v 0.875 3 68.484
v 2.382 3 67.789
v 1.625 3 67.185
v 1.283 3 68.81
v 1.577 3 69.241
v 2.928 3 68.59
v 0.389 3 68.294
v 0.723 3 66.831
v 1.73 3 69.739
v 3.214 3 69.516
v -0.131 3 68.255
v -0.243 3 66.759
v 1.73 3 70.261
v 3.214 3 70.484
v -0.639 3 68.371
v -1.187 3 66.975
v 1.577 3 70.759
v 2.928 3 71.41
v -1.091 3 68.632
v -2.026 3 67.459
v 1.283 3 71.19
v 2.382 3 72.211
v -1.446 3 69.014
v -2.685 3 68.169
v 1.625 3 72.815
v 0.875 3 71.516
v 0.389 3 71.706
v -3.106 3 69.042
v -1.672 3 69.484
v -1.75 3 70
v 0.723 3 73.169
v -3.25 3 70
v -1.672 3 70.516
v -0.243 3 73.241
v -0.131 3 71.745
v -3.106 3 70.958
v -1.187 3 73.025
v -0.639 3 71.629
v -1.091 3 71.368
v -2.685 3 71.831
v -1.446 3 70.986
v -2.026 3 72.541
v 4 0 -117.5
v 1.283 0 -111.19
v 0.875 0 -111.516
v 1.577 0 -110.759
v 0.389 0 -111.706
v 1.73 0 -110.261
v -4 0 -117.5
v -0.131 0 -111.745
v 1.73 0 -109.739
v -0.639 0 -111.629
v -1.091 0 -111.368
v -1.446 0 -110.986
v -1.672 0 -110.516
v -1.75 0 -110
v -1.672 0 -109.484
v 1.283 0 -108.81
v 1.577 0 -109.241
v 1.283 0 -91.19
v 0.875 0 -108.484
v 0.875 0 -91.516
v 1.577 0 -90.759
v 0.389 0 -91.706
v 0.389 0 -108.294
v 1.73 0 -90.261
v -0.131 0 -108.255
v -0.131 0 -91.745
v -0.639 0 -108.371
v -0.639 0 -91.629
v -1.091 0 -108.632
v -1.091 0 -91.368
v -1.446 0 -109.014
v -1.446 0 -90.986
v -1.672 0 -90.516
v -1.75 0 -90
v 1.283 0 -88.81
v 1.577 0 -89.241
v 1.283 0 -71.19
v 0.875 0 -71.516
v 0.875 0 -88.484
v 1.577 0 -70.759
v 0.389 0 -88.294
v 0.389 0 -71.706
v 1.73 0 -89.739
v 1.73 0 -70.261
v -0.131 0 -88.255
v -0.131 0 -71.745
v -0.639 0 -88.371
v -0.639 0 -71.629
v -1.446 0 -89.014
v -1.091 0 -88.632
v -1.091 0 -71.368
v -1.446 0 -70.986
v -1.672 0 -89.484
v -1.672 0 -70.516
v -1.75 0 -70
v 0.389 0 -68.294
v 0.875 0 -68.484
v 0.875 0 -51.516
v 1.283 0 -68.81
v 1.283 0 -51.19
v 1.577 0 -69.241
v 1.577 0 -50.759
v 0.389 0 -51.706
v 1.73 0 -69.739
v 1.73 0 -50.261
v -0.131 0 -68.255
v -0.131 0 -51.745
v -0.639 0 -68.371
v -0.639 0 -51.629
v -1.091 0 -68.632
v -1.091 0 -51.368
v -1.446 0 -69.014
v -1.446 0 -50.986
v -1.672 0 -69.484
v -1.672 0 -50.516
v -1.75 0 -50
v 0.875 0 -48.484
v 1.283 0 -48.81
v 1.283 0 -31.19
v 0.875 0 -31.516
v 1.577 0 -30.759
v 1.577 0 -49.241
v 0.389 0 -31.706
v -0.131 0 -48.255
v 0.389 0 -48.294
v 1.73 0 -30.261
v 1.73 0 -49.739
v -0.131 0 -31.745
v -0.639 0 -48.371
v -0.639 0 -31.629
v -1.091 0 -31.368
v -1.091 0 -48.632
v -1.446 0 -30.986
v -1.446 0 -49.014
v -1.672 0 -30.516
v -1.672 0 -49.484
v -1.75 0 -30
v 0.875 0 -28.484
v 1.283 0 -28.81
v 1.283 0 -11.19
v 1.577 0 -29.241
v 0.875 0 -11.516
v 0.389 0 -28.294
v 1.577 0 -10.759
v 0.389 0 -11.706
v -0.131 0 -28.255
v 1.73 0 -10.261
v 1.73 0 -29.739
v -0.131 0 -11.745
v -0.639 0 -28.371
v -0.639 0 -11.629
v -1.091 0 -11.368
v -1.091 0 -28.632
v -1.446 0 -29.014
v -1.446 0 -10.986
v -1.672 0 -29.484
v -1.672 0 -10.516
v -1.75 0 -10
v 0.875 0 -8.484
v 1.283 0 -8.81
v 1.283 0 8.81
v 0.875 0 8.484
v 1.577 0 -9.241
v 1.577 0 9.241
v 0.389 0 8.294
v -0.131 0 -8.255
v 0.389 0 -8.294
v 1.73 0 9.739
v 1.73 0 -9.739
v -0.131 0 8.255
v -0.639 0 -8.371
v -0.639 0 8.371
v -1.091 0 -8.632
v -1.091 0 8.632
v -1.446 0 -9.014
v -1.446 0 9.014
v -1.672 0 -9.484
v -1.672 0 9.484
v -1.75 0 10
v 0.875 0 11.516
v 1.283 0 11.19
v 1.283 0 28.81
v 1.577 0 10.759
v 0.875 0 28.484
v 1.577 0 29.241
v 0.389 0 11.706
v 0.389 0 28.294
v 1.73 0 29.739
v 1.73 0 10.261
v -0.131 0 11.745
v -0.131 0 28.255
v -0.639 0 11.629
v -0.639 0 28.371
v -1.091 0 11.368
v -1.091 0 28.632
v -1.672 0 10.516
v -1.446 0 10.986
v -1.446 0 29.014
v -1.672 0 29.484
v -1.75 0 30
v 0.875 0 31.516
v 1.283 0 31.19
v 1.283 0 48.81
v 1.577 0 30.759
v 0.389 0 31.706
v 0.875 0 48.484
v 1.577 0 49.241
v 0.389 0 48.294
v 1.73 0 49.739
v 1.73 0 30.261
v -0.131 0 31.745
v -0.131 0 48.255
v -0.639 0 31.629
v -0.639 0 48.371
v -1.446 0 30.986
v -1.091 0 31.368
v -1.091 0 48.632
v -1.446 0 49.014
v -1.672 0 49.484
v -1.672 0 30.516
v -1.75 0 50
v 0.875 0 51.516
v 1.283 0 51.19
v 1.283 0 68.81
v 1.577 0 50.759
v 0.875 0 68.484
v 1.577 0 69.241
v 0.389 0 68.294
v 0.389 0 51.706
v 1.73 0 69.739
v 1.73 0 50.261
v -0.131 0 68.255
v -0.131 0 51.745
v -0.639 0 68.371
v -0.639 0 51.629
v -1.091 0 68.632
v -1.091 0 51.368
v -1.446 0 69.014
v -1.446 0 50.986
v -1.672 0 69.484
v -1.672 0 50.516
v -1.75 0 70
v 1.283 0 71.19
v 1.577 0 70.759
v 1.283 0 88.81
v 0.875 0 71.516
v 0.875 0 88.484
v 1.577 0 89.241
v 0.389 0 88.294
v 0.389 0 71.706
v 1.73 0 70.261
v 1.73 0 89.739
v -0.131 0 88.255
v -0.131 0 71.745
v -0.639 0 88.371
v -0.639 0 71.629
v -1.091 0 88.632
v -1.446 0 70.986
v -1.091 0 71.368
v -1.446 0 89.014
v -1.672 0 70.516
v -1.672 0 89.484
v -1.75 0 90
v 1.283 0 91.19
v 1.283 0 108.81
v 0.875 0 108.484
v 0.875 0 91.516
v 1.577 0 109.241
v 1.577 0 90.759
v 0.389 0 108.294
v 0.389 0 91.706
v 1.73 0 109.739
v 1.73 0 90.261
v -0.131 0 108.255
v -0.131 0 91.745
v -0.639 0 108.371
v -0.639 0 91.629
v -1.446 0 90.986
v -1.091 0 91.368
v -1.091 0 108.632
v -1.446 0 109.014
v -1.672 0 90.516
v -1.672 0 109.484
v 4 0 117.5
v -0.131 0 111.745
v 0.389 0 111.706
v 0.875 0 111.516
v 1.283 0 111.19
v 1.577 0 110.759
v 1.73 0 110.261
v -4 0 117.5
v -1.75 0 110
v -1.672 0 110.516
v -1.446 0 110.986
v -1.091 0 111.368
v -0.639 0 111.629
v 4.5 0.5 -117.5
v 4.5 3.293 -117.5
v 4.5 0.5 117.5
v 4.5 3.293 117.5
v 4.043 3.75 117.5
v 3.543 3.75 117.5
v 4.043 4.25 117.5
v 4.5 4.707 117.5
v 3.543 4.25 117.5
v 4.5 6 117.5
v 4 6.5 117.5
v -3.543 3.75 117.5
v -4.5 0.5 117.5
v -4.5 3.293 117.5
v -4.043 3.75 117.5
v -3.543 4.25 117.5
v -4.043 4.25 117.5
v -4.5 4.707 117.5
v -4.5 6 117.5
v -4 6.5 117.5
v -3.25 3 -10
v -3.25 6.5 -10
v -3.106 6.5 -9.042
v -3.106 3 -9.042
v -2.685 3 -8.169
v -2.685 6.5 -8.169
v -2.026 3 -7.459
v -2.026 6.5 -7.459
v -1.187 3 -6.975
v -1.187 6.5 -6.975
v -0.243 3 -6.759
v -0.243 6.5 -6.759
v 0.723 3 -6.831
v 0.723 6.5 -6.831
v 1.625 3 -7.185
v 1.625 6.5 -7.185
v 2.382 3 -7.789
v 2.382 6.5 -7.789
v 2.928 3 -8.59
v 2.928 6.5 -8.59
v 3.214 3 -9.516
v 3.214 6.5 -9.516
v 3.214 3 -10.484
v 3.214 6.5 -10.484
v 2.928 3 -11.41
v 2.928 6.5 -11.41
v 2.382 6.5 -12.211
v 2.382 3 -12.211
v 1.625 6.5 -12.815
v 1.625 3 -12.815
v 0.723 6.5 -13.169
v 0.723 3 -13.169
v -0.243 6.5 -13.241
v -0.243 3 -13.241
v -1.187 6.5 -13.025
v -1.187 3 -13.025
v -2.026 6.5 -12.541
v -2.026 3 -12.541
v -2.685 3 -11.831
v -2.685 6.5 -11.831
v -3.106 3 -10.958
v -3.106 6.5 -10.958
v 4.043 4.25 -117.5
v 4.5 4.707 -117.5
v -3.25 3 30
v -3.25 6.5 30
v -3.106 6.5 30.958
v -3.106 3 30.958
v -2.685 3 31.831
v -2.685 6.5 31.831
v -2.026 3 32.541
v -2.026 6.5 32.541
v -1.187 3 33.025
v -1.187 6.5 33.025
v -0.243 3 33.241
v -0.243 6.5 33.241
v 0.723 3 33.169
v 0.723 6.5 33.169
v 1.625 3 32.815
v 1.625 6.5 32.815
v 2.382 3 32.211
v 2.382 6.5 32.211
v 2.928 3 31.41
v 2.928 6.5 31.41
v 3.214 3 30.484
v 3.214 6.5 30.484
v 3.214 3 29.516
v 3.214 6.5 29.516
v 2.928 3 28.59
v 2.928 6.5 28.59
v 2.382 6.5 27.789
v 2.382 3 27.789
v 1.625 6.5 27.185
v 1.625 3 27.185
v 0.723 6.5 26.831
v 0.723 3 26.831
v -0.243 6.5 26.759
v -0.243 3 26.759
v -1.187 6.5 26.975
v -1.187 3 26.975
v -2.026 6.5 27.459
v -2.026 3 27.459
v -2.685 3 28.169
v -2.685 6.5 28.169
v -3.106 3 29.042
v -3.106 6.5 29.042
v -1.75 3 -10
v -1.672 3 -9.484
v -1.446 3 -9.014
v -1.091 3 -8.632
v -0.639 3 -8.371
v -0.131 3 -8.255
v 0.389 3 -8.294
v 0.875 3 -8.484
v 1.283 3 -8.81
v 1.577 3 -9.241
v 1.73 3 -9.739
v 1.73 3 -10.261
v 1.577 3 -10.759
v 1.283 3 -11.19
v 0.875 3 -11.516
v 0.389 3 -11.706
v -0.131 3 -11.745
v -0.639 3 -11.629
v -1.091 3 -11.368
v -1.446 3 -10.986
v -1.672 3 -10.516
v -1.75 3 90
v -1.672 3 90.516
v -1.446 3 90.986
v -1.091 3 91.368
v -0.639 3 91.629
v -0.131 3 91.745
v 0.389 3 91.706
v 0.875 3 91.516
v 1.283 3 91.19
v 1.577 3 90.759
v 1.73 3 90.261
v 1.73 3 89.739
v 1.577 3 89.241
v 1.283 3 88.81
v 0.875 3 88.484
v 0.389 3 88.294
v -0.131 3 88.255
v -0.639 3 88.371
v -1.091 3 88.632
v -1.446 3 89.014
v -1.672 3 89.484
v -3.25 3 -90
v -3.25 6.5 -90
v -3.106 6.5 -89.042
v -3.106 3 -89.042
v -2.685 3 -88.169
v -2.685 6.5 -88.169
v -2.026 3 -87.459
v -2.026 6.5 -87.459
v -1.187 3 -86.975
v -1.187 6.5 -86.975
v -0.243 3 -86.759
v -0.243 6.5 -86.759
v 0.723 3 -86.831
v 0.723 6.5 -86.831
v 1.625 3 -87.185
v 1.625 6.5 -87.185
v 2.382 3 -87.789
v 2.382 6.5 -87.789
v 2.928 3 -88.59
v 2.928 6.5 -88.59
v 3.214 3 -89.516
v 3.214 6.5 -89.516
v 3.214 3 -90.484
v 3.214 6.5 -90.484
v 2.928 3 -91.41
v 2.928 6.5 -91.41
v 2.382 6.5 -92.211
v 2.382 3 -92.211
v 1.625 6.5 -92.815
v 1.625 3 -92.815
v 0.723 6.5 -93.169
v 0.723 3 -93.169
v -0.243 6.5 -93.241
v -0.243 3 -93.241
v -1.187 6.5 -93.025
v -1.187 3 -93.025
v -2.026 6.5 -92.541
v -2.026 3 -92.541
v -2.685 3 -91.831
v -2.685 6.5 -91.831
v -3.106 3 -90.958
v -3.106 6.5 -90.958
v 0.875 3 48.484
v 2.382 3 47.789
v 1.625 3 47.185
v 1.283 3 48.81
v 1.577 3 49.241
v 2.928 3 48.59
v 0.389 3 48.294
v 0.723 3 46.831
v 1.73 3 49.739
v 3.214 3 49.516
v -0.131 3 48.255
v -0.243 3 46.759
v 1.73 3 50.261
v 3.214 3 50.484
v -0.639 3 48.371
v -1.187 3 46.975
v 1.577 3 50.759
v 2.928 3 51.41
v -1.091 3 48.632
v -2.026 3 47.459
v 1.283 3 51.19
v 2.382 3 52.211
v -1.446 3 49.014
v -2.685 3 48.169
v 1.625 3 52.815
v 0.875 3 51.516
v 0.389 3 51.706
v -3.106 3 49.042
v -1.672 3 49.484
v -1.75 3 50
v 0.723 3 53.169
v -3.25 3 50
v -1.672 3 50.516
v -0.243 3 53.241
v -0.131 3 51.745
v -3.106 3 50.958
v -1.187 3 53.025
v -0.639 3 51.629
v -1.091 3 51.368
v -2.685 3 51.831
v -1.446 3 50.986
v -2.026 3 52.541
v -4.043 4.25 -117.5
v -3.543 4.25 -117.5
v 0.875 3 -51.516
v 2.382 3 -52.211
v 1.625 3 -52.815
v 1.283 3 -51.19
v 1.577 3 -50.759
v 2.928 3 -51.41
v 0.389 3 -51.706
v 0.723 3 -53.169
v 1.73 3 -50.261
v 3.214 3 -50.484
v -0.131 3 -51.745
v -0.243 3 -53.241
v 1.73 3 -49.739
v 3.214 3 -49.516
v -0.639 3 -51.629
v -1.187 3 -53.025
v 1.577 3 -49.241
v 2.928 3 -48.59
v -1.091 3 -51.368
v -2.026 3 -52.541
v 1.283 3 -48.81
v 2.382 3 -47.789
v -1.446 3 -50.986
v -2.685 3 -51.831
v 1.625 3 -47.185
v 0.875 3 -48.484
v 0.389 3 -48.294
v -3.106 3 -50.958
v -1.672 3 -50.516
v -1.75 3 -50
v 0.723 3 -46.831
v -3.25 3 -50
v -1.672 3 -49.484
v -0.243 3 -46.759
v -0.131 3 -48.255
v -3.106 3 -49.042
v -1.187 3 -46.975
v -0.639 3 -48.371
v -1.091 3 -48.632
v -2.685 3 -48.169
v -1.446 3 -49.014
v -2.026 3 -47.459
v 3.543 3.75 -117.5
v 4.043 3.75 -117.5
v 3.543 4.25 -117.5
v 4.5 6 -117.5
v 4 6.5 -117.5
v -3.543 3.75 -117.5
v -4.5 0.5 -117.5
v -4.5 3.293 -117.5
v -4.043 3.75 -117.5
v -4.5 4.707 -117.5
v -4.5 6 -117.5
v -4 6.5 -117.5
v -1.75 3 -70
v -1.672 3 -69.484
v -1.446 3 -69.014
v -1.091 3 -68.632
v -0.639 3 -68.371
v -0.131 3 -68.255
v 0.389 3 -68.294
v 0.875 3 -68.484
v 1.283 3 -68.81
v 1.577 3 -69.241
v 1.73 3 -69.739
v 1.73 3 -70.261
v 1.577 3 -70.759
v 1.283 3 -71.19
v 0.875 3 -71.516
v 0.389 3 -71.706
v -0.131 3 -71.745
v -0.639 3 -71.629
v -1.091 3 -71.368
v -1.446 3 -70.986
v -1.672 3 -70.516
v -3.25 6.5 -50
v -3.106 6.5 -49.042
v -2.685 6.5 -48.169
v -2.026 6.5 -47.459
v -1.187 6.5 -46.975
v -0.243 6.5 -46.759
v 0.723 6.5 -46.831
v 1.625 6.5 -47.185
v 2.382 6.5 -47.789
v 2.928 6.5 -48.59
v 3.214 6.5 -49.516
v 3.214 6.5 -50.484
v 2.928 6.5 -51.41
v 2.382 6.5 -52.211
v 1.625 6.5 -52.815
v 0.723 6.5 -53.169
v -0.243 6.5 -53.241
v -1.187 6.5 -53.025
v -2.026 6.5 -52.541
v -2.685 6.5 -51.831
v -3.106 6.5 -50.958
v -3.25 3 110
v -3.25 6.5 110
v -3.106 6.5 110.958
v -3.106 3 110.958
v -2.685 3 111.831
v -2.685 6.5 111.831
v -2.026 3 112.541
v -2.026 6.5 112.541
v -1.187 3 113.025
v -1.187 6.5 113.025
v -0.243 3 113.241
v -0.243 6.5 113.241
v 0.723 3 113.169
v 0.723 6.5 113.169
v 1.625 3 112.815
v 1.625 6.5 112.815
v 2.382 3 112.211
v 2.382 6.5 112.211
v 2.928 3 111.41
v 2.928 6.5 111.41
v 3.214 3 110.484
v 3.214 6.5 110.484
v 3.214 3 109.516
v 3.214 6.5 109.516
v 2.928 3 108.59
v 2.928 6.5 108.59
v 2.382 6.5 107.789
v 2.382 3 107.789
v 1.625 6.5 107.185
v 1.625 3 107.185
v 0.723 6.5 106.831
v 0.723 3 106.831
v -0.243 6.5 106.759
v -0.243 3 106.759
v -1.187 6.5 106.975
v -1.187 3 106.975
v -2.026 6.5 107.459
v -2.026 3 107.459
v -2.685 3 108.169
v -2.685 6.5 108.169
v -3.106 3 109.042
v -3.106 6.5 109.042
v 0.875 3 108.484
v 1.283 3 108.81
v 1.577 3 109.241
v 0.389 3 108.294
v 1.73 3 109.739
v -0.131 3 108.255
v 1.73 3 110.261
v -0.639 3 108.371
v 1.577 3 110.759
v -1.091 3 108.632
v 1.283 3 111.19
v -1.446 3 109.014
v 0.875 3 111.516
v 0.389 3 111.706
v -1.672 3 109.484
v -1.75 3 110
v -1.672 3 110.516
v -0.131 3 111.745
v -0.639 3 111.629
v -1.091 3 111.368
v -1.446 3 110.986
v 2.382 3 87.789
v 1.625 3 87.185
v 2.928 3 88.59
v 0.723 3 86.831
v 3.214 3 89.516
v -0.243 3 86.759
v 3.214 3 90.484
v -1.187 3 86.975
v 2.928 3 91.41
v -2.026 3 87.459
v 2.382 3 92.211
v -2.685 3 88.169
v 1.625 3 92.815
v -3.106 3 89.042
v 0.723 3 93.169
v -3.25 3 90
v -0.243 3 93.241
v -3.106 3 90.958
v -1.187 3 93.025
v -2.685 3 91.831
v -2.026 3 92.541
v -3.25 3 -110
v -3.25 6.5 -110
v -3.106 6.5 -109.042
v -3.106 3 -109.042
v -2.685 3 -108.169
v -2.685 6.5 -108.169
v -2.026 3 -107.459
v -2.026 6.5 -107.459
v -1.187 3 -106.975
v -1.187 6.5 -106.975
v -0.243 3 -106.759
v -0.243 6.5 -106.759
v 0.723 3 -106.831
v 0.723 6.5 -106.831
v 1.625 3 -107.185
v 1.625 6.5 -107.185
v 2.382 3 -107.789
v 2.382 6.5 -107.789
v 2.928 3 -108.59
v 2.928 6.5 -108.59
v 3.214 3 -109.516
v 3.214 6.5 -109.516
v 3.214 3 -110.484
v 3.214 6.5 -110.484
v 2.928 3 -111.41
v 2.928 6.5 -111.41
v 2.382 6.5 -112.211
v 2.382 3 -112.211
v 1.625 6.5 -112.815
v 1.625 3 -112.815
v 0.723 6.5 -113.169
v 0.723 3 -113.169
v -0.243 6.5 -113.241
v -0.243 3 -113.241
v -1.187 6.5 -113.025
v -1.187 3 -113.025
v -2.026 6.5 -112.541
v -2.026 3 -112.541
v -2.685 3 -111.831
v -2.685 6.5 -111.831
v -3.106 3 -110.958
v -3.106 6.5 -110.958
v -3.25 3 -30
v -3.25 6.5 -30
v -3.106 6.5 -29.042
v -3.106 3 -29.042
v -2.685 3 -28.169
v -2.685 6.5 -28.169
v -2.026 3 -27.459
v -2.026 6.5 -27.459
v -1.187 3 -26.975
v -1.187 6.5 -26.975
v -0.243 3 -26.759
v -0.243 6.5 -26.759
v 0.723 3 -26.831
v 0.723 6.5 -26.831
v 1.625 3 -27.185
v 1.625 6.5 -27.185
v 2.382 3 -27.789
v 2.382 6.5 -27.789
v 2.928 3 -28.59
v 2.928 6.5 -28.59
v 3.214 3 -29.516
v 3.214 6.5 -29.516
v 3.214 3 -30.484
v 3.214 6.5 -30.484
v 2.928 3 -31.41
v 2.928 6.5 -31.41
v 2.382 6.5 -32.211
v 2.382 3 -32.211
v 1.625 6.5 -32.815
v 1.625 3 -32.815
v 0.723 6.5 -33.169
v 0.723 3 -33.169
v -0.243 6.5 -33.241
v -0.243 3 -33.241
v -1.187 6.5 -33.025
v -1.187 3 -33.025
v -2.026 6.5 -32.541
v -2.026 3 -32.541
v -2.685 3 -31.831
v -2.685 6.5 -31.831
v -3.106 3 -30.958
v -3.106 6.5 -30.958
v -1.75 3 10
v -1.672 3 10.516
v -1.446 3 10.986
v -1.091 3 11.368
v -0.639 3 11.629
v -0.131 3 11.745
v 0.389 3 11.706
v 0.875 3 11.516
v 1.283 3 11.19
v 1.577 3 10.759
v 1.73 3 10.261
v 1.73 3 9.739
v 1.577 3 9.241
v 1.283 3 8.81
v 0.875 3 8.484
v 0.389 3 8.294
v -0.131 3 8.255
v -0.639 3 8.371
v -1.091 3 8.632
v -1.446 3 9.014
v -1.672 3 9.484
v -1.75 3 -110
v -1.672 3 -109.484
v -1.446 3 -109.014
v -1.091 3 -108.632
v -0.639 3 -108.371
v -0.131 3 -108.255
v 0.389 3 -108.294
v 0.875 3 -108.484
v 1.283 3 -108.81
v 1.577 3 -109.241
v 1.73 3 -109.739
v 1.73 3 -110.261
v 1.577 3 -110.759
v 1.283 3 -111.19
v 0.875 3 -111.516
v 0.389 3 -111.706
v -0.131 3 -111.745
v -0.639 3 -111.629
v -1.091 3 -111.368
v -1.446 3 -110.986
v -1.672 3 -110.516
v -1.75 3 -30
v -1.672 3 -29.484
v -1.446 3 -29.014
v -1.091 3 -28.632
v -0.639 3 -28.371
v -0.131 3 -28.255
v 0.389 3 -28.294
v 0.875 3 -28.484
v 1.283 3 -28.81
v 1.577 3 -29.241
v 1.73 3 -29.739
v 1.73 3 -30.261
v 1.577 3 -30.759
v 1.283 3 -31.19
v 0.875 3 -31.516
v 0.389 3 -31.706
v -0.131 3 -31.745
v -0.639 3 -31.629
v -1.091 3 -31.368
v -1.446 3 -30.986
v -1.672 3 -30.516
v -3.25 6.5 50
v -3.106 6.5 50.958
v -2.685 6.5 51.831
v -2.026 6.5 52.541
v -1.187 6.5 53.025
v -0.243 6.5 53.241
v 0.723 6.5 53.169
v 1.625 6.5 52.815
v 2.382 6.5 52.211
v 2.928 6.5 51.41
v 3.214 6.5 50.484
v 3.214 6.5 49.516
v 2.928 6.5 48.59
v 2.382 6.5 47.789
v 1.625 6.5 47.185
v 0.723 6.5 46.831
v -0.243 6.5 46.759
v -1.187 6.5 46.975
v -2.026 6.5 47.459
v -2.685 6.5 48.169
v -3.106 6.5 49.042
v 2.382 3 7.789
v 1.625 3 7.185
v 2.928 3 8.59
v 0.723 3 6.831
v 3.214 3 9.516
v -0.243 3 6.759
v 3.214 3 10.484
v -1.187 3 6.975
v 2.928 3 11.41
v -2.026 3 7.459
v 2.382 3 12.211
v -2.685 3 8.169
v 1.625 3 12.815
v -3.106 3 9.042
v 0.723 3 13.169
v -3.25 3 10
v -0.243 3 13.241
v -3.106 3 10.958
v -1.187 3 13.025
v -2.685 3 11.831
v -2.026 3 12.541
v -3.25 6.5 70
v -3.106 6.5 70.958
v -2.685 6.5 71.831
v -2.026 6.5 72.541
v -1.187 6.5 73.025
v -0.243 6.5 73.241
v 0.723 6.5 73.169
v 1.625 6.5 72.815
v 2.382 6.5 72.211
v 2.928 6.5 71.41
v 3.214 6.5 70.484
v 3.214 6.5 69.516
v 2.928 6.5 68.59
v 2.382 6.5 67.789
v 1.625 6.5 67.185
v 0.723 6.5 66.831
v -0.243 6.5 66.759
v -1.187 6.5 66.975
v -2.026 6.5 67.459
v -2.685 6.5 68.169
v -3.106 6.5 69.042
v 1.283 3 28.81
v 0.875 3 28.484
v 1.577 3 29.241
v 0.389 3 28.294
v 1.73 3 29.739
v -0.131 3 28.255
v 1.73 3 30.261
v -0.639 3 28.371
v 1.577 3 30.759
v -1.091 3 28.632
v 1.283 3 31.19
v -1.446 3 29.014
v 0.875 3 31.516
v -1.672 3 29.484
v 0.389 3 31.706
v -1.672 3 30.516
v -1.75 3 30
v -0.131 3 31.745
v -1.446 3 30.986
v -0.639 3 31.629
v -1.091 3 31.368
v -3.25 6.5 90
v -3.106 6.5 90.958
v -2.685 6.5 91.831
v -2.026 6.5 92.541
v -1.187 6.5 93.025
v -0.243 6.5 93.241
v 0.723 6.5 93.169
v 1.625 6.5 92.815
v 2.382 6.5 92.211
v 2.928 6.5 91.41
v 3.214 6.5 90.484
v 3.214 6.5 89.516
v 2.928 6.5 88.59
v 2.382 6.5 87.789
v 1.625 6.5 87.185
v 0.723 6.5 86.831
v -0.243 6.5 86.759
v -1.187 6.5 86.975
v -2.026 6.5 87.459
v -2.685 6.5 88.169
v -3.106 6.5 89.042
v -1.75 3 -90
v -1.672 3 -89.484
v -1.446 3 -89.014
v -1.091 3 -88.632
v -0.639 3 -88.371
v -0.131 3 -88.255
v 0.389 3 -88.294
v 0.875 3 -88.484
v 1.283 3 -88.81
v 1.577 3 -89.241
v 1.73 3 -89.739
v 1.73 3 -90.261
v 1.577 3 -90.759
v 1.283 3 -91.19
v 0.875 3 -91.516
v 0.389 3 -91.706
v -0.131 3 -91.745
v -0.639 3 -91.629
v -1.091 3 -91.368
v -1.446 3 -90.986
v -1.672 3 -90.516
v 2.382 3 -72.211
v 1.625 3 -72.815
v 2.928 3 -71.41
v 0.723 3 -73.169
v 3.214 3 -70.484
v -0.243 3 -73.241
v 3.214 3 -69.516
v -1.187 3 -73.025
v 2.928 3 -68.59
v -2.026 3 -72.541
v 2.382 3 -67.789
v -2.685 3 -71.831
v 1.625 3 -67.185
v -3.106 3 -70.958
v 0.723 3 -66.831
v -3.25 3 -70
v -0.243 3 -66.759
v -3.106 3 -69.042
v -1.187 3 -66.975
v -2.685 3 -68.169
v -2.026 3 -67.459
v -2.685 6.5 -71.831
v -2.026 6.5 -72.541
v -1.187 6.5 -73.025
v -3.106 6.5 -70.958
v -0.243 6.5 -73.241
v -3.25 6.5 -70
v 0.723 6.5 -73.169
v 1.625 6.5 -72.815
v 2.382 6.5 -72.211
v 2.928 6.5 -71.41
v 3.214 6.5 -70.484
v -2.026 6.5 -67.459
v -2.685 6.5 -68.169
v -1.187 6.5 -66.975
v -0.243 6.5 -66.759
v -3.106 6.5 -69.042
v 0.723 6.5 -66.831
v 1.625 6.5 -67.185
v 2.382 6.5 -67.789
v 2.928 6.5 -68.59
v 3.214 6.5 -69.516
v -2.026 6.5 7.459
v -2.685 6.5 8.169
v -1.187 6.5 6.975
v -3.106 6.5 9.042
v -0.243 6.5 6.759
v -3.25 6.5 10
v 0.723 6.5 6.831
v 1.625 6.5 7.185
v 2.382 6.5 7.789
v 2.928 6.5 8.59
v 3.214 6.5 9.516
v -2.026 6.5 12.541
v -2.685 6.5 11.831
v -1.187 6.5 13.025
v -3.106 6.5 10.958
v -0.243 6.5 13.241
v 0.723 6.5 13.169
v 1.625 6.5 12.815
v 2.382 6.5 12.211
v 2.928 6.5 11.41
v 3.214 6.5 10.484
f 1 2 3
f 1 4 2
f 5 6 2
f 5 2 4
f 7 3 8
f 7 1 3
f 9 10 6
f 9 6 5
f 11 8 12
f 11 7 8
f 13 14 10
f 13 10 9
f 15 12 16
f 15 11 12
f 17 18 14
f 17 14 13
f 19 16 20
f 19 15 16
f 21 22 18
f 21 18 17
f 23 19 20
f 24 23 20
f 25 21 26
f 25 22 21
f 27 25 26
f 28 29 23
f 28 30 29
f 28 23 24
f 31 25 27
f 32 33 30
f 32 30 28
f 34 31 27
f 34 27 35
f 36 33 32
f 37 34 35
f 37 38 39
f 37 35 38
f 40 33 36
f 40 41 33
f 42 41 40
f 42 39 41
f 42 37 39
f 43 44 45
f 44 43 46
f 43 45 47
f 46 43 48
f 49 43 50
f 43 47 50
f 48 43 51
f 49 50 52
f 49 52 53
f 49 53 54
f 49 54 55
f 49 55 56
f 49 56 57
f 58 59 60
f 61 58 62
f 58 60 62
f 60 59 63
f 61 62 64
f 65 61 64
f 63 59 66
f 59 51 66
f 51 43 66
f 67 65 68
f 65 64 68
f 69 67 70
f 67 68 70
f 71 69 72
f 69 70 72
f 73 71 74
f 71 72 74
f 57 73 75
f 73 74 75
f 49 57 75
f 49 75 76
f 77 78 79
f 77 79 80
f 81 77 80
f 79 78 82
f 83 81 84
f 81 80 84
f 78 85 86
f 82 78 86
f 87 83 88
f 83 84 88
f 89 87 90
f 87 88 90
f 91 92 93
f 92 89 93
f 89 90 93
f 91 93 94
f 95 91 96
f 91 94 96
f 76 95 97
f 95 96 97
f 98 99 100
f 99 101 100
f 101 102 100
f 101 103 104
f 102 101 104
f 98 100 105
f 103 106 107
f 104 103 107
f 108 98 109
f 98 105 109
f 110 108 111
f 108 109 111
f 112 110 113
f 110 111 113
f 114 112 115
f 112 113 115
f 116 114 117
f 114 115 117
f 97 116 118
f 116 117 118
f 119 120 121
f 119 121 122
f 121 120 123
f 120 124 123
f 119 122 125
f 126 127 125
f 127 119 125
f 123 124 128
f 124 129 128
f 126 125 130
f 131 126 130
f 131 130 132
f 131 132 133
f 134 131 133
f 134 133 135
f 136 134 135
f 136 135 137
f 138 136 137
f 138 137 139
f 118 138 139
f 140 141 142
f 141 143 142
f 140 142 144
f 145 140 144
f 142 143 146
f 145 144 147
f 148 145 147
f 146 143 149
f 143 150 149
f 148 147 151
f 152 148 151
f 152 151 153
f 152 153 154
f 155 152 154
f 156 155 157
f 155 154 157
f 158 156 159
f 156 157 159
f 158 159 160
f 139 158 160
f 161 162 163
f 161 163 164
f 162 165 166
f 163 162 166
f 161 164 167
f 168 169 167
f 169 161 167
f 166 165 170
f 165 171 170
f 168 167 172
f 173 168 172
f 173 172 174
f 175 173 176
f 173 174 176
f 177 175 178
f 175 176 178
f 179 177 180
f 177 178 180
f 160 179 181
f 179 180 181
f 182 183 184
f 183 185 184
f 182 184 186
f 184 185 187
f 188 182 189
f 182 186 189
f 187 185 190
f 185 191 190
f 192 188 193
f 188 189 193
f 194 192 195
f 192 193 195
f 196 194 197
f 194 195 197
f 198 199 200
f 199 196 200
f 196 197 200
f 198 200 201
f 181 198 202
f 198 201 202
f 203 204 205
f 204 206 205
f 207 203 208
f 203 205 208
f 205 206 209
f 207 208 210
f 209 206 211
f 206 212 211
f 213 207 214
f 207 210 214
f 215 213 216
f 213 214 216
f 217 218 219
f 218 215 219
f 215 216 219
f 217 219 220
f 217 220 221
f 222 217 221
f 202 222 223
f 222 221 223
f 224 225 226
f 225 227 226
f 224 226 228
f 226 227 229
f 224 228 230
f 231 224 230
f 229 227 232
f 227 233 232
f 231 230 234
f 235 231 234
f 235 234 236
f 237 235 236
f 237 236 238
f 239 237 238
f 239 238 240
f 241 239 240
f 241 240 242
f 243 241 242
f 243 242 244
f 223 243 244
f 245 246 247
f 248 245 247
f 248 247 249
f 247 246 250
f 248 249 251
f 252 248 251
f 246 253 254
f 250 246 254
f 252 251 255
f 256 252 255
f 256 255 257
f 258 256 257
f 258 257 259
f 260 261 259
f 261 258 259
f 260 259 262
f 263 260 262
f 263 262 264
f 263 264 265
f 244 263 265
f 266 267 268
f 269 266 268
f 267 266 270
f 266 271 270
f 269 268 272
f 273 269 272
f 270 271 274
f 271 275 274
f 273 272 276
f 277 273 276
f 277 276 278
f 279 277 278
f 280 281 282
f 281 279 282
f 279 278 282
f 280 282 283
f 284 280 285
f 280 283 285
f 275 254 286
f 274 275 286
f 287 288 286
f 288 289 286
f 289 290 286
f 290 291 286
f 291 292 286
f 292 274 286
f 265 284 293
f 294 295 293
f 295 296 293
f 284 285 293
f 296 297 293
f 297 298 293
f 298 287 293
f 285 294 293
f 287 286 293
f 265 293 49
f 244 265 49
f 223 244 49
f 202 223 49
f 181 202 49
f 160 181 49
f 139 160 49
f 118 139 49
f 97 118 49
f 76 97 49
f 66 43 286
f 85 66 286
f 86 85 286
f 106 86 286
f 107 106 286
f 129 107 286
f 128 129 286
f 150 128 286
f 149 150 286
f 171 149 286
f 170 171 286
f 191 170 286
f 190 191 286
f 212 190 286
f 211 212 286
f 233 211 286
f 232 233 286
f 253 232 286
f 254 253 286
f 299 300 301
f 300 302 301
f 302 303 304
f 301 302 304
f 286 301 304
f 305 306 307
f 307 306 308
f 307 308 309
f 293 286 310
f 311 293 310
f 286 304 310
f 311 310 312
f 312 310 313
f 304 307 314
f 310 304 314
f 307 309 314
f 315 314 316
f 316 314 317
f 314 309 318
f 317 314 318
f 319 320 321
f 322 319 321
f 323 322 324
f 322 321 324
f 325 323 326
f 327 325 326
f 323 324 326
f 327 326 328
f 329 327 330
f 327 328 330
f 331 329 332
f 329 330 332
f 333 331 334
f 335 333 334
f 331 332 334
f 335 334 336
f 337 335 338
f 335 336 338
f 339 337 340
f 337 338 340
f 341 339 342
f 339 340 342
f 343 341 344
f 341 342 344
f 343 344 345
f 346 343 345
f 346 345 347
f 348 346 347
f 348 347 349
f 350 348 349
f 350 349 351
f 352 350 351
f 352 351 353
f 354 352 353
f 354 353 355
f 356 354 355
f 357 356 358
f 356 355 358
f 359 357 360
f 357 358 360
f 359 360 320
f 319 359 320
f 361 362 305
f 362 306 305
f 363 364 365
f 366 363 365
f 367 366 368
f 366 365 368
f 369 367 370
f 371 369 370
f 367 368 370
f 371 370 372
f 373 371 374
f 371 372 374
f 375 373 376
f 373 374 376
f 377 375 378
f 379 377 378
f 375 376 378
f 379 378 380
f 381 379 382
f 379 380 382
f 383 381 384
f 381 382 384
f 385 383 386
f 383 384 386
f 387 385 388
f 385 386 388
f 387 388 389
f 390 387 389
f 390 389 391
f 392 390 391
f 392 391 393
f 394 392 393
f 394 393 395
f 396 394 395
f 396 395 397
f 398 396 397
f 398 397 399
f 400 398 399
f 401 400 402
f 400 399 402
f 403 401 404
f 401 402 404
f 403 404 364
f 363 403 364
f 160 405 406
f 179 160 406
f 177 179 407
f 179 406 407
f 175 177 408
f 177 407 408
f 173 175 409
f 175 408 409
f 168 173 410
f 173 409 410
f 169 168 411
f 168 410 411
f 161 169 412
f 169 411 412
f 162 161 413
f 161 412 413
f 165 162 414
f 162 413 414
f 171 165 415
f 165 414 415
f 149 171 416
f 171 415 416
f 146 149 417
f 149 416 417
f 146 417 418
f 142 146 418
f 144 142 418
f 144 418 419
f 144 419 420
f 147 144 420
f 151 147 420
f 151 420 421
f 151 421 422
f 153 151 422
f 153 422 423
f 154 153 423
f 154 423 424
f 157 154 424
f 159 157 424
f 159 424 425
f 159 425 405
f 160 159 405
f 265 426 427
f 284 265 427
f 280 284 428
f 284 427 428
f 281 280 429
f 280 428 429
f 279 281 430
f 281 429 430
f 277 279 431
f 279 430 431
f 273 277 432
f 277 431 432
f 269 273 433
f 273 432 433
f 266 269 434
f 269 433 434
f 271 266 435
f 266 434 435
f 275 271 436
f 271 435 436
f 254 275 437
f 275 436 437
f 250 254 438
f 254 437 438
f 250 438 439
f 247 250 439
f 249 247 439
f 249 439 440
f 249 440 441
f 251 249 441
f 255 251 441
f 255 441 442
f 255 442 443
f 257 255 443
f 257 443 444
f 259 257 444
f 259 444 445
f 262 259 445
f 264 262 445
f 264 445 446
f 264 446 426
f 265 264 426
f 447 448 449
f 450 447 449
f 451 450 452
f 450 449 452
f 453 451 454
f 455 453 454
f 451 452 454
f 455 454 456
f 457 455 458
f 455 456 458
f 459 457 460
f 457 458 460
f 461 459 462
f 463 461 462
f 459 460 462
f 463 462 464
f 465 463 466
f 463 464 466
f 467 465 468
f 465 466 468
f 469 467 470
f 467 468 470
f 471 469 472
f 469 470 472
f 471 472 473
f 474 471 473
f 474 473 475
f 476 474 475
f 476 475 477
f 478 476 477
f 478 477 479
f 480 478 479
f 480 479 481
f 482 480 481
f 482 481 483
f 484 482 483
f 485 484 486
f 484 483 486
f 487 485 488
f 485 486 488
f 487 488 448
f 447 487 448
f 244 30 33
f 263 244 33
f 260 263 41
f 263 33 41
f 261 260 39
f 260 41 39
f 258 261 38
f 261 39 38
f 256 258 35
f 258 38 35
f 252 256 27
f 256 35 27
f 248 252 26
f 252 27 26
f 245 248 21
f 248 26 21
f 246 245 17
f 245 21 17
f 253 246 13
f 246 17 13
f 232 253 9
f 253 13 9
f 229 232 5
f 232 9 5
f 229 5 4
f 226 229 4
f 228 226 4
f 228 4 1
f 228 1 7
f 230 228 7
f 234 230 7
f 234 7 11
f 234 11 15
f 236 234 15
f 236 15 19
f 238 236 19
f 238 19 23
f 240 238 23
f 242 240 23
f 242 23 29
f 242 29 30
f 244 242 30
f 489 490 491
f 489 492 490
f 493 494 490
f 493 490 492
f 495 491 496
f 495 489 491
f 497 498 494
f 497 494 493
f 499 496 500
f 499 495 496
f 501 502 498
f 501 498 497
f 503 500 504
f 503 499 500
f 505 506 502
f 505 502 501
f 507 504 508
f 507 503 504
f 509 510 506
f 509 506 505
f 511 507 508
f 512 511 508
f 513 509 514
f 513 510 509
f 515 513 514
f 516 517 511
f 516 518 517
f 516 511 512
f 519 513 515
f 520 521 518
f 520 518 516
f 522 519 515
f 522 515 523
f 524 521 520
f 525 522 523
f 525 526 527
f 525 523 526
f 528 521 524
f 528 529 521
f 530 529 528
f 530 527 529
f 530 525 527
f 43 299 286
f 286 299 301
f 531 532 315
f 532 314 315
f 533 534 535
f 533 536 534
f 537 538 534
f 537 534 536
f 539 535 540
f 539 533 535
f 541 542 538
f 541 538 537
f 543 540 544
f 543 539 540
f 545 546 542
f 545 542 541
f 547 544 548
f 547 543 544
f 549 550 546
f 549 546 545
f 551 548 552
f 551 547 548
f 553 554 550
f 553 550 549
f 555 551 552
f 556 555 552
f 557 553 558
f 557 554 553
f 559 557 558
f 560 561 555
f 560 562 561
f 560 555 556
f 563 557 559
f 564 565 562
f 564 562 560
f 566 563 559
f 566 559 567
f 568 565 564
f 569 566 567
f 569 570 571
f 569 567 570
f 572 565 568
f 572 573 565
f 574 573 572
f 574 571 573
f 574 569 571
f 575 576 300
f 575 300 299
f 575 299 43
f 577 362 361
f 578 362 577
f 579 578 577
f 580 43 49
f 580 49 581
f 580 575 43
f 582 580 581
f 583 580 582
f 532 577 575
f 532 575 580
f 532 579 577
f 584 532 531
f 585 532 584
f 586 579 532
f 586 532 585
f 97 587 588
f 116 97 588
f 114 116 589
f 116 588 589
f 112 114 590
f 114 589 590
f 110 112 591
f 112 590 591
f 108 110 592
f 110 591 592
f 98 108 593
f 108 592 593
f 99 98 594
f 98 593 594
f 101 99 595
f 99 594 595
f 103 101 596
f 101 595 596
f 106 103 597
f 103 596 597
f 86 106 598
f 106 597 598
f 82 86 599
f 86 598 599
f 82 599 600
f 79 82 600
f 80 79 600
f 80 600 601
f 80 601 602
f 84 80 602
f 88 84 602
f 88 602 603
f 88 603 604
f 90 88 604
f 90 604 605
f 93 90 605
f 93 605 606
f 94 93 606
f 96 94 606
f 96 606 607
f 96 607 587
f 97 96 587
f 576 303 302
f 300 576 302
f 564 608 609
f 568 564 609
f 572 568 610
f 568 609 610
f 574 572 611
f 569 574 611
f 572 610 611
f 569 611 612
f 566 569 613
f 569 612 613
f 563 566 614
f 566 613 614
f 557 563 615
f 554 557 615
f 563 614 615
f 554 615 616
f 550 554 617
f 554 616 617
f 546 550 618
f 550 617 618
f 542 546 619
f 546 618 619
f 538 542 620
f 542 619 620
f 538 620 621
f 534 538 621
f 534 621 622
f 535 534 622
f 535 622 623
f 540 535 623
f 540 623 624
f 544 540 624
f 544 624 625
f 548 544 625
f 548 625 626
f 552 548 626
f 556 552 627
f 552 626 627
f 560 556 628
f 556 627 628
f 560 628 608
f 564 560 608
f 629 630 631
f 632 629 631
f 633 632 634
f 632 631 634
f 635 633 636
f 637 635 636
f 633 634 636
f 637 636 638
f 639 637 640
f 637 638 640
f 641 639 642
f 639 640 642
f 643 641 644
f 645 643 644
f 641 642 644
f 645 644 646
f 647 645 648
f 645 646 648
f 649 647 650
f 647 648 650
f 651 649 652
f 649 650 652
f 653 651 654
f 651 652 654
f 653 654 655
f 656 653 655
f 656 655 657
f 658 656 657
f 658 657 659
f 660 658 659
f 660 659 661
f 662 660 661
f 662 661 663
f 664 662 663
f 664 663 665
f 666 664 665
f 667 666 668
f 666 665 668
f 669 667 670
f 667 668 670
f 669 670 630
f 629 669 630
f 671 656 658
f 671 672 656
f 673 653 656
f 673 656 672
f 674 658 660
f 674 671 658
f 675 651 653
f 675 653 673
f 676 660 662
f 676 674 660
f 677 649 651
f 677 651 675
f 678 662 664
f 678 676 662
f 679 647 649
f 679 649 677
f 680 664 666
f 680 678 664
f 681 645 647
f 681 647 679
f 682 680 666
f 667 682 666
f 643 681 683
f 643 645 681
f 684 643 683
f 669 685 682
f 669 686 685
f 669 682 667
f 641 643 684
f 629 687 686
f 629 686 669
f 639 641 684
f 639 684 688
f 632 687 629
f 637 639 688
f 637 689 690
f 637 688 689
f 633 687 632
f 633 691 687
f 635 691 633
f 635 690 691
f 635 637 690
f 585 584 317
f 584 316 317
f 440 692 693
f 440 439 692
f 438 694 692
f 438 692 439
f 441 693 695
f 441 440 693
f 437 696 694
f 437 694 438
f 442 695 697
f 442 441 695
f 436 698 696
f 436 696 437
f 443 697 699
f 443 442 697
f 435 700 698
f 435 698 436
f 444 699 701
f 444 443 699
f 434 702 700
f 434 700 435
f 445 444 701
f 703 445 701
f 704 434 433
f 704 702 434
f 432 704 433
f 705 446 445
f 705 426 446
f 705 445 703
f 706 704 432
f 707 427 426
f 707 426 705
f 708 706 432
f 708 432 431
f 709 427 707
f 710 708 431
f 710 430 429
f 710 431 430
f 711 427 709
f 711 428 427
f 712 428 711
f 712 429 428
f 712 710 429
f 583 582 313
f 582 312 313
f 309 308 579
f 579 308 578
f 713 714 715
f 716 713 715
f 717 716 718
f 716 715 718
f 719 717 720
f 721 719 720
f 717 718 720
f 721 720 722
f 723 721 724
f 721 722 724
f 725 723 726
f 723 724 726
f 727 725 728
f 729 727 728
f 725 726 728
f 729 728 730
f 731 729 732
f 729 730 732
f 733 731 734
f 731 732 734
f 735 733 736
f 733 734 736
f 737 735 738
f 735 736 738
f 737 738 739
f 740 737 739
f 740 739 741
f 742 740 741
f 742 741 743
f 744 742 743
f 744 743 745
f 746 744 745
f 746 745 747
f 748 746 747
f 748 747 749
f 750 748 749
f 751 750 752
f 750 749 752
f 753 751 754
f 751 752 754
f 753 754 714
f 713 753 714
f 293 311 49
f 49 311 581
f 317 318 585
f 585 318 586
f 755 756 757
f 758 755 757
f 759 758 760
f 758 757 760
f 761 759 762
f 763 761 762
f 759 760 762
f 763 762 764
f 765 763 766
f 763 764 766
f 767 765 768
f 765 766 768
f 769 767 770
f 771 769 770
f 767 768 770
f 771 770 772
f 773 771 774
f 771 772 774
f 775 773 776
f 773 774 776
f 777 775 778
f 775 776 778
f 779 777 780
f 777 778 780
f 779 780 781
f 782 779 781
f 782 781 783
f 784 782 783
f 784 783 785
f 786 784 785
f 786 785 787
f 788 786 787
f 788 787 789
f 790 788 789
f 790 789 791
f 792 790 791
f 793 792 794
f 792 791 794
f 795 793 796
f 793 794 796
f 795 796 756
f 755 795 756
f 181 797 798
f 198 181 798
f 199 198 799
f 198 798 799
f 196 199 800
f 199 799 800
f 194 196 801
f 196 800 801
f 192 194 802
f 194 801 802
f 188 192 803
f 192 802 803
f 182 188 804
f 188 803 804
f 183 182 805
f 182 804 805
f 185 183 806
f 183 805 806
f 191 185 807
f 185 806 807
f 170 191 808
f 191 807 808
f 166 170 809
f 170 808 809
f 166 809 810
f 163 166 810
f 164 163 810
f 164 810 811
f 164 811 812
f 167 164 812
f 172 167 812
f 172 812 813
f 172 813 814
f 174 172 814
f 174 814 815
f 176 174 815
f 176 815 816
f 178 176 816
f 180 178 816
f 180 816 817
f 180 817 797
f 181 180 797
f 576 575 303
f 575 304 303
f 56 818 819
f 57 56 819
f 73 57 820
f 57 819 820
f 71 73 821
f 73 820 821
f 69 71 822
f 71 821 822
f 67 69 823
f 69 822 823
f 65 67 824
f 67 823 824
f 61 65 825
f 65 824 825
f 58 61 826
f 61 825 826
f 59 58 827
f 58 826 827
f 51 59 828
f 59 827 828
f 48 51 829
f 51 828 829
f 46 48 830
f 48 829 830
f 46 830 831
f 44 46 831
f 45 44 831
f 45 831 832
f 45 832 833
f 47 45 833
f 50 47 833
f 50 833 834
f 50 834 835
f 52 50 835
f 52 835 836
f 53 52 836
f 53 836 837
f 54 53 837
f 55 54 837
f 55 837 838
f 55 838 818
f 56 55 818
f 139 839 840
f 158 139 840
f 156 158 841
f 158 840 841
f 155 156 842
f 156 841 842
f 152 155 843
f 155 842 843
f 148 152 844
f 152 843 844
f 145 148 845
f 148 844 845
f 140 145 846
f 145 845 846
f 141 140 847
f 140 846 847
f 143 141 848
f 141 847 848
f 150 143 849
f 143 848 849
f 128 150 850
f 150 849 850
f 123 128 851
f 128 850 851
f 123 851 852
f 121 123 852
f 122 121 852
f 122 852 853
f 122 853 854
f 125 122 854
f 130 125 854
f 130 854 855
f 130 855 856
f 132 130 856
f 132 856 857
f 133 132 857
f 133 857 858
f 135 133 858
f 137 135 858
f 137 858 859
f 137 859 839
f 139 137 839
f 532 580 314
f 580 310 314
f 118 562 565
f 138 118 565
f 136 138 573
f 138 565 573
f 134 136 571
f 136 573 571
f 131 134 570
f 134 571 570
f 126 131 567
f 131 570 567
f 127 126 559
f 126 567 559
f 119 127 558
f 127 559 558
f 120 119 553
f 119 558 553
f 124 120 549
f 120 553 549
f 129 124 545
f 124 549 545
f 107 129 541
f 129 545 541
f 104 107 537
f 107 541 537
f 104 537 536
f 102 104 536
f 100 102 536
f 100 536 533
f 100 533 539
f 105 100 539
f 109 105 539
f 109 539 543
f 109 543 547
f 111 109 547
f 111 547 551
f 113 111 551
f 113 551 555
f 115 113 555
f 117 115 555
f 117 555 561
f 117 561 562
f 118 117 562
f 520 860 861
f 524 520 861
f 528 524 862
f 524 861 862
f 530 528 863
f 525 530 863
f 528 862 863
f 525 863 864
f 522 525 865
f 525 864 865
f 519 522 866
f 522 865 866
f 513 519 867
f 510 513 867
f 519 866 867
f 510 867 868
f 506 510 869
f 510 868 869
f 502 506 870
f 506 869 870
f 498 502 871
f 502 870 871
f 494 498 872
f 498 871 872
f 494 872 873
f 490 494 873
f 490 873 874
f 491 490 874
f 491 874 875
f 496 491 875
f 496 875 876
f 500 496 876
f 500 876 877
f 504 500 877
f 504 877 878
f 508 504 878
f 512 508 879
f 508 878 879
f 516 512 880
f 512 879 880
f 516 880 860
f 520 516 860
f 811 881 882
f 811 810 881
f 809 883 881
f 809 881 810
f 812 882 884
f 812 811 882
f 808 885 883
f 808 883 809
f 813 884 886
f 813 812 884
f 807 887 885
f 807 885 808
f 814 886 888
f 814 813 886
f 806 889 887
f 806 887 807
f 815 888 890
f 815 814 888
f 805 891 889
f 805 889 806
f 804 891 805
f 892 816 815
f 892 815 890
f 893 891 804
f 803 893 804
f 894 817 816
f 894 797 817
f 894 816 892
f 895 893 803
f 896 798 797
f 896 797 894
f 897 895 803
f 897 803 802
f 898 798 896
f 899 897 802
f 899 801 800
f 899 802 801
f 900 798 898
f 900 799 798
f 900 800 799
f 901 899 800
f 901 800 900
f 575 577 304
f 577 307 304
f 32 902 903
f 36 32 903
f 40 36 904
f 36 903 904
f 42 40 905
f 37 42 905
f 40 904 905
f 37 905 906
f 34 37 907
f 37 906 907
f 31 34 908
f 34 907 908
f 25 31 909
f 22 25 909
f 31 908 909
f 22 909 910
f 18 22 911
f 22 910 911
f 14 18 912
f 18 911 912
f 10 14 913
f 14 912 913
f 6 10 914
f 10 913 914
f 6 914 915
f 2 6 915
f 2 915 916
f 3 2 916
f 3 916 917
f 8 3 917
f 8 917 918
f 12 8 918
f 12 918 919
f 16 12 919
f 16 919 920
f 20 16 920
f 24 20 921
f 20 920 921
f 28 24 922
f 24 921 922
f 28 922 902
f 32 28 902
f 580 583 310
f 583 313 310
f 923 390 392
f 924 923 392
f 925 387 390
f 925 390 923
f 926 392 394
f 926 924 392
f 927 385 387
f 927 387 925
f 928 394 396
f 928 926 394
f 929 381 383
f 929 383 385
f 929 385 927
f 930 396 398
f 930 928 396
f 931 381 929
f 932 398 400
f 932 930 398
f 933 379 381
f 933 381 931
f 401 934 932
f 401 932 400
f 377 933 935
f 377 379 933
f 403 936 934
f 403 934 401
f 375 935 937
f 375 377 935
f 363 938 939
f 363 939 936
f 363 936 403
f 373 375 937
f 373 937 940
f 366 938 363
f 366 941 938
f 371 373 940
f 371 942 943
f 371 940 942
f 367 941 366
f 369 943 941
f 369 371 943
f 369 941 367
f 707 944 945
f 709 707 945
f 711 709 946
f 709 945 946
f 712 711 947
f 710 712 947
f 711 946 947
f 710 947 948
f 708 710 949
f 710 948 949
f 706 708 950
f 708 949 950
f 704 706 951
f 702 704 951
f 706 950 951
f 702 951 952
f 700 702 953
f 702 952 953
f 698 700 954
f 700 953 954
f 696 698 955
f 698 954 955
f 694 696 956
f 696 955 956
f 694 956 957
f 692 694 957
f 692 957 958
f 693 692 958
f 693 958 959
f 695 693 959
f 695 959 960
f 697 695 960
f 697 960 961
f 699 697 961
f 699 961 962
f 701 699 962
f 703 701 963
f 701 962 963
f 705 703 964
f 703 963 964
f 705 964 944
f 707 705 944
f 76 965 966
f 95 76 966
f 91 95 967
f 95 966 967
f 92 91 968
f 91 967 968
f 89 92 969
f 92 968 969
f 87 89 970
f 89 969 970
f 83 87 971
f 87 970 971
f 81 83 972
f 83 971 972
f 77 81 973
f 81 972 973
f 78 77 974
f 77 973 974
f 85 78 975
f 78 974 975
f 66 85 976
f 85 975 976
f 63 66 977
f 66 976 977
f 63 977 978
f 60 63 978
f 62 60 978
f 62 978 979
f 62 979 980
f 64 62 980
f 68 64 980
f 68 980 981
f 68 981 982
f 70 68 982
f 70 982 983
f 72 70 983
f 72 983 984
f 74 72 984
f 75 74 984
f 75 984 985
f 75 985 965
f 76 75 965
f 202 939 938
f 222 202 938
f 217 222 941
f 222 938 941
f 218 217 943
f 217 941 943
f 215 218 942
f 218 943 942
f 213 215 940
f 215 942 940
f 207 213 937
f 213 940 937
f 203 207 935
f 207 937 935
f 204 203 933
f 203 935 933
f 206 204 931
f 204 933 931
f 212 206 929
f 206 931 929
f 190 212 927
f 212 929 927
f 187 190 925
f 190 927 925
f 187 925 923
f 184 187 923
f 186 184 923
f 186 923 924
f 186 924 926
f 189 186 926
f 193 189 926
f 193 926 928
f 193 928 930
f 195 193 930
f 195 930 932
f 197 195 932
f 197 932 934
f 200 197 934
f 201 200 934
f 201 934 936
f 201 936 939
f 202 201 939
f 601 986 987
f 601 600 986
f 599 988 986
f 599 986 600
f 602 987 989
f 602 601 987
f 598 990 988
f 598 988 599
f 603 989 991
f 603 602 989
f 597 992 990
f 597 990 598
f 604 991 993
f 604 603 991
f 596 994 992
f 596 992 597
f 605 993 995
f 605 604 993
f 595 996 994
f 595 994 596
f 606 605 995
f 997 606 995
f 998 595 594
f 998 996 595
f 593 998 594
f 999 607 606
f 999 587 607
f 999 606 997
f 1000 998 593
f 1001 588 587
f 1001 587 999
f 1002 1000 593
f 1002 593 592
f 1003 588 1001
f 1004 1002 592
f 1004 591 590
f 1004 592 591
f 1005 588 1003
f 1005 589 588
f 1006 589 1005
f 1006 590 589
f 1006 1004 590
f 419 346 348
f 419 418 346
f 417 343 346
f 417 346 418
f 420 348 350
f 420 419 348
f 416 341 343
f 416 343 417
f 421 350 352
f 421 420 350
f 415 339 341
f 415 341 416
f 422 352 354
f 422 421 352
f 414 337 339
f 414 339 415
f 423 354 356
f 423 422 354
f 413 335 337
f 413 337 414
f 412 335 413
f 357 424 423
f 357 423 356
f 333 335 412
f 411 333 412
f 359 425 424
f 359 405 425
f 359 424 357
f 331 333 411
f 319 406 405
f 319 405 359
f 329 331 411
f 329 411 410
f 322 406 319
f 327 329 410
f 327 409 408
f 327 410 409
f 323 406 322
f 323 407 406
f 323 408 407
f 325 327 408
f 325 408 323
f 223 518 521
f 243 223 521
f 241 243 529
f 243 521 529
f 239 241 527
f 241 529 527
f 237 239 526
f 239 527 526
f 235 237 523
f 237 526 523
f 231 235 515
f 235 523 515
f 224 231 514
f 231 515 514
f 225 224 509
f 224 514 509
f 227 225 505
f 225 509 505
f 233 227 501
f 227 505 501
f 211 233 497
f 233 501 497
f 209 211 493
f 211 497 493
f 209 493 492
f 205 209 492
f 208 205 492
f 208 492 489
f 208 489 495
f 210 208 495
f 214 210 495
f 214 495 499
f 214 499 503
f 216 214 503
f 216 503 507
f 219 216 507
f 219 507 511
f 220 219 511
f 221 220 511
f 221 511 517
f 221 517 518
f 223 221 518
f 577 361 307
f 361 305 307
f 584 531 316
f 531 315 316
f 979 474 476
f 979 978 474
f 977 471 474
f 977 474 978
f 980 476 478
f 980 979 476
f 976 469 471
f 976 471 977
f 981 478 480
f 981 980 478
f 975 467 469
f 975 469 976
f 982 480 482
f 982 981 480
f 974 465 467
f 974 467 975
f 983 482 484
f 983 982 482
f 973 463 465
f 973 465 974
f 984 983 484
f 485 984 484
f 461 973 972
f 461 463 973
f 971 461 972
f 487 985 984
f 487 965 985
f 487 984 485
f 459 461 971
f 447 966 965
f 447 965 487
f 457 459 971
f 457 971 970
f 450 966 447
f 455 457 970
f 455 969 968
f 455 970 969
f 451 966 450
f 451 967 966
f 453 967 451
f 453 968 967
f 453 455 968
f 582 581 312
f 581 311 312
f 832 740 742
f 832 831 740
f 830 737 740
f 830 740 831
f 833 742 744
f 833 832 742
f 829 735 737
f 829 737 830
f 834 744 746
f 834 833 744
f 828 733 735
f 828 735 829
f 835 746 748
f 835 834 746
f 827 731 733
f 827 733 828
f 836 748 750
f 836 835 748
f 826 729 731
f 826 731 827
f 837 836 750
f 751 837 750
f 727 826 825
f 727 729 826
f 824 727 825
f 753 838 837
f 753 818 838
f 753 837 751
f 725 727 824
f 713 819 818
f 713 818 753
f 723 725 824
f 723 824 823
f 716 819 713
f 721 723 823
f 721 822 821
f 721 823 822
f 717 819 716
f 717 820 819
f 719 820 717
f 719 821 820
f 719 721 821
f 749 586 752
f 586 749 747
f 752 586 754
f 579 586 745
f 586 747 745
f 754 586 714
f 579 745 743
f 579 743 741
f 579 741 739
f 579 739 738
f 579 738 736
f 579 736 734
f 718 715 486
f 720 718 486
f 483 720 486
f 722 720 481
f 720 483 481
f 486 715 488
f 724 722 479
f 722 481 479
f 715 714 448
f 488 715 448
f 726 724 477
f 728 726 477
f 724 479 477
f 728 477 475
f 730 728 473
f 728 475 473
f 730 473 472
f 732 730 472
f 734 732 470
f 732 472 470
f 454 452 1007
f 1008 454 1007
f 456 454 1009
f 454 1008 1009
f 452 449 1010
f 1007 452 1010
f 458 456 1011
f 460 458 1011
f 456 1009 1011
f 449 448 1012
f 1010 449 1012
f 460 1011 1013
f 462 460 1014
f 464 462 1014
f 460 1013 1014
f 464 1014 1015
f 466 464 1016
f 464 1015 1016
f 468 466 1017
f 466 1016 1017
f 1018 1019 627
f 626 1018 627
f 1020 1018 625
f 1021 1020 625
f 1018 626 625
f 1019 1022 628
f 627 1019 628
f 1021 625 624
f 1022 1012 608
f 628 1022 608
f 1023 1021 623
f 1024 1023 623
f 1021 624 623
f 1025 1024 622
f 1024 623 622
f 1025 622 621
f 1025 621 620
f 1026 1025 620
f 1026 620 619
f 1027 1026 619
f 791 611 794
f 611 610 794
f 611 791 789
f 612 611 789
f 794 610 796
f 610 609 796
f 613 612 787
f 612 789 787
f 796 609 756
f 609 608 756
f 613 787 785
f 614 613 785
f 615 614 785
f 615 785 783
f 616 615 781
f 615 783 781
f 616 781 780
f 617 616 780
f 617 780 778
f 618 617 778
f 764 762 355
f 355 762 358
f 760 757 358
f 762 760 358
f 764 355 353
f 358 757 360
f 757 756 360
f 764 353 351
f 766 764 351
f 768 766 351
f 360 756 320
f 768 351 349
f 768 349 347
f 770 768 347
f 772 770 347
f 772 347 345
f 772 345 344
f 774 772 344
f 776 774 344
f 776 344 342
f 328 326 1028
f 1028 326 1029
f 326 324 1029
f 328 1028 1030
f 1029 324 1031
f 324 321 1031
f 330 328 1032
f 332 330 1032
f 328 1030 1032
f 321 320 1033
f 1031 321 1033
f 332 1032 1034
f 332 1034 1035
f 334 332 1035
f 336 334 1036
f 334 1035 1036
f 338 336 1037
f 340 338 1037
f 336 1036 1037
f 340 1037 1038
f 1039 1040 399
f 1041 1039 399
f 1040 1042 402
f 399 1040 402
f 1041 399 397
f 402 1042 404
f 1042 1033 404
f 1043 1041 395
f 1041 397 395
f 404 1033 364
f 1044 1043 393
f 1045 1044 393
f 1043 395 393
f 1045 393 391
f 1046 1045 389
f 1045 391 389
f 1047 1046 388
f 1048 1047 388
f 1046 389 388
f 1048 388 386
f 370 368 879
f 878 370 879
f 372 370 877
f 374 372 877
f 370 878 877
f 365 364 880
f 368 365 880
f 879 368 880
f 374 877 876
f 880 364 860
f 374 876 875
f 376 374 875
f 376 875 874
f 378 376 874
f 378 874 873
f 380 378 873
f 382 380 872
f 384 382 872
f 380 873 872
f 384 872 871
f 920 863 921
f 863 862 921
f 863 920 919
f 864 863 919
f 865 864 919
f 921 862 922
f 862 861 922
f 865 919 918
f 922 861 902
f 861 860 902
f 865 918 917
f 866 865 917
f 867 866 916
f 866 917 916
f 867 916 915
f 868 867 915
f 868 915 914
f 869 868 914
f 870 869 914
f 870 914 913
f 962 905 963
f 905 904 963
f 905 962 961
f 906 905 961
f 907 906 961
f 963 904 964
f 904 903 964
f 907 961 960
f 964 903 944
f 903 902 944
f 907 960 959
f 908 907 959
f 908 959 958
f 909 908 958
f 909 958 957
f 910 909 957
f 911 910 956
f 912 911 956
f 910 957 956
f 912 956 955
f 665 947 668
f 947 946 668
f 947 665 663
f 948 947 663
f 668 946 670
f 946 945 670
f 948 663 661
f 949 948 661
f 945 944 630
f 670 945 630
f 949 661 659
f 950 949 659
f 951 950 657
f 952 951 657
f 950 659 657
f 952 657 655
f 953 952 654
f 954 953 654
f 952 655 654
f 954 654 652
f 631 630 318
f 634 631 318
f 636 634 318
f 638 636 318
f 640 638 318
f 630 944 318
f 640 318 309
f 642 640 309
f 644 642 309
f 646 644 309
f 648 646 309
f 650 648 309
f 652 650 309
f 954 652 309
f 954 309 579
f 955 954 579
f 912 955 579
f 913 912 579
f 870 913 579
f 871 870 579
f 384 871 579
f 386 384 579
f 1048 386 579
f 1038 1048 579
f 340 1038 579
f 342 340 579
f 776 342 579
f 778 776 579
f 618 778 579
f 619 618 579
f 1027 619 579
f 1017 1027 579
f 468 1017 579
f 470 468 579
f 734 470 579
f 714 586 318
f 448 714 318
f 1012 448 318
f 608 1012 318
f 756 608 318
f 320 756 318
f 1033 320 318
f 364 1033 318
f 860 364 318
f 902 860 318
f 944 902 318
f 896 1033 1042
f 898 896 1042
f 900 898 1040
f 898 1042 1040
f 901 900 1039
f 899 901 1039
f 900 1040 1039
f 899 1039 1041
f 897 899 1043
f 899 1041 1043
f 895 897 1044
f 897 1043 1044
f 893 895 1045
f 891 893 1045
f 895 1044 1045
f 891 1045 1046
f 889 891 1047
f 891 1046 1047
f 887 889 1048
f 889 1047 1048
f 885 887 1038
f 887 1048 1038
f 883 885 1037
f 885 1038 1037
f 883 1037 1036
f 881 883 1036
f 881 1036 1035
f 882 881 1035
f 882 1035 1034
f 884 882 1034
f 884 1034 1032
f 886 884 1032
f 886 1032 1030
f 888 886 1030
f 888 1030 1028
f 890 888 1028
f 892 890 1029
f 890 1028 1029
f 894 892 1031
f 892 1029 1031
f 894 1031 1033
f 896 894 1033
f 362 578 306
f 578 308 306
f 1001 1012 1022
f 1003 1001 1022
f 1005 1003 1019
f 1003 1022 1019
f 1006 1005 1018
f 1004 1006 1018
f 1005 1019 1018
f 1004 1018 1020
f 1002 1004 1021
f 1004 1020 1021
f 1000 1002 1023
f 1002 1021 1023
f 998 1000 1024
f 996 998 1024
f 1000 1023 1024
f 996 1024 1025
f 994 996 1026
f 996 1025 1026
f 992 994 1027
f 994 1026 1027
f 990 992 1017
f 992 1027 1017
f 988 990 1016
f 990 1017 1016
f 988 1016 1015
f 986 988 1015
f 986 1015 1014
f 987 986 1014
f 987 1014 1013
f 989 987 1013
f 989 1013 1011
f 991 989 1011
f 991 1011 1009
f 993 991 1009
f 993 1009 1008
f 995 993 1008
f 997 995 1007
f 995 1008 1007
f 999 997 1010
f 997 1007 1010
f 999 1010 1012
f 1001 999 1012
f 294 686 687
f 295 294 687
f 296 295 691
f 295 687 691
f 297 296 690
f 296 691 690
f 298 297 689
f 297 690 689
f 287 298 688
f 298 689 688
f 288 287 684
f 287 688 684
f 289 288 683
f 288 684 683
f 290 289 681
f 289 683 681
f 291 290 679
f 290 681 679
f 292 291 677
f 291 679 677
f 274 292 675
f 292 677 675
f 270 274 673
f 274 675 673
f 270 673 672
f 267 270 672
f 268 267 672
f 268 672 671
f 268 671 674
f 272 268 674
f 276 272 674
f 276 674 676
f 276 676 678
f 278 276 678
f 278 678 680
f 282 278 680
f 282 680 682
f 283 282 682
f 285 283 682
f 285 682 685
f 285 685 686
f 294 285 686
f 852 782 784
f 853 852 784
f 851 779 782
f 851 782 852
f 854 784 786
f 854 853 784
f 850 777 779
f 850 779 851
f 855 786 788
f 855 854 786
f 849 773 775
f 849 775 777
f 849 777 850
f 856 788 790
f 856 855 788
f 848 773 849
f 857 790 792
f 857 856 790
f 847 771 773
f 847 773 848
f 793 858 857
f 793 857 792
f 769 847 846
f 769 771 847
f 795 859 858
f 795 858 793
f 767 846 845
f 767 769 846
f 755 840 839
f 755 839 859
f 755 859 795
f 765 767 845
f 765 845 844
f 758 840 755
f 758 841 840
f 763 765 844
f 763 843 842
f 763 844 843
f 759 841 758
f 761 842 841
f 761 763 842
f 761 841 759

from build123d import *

# Parameters (mm, degrees)
EXTRUDE_1_DEPTH        = 117.5
SKETCH_2_R             = 1.75
CUT_EXTRUDE_1_DEPTH    = 118.765657133
CHAMFER_1_SIZE         = 0.5
SKETCH_3_R             = 3.25
CUT_EXTRUDE_2_DEPTH    = 3.5
PATTERN_LINEAR_1_COUNT = 12
PATTERN_LINEAR_1_PITCH = 20


with BuildPart() as part:
    # 草图1 → 凸台-拉伸1 (new, symmetric)
    with BuildSketch(Plane.XY):
        Polygon((4.5, 0), (-4.5, 0), (-4.5, 3.292893219), (-4.042893219, 3.75), (-3.542893219, 3.75), (-3.542893219, 4.25), (-4.042893219, 4.25), (-4.5, 4.707106781), (-4.5, 6.5), (4.5, 6.5), (4.5, 4.707106781), (4.042893219, 4.25), (3.542893219, 4.25), (3.542893219, 3.75), (4.042893219, 3.75), (4.5, 3.292893219), align=None)
    extrude(amount=EXTRUDE_1_DEPTH, both=True)

    # 草图2 → 切除-拉伸1 (cut, through all)
    with BuildSketch(Plane(origin=(0, 6.5, 0), x_dir=(1, 0, 0), z_dir=(0, 1, 0))):
        with Locations(Location((0, 110, 0), (0, 0, 180))):
            Circle(SKETCH_2_R)
        with Locations(Location((0, 90, 0), (0, 0, 180))):
            Circle(SKETCH_2_R)
        with Locations(Location((0, 70, 0), (0, 0, 180))):
            Circle(SKETCH_2_R)
        with Locations(Location((0, 50, 0), (0, 0, 180))):
            Circle(SKETCH_2_R)
        with Locations(Location((0, 30, 0), (0, 0, 180))):
            Circle(SKETCH_2_R)
        with Locations(Location((0, 10, 0), (0, 0, 180))):
            Circle(SKETCH_2_R)
        with Locations(Location((0, -10, 0), (0, 0, 180))):
            Circle(SKETCH_2_R)
        with Locations(Location((0, -30, 0), (0, 0, 180))):
            Circle(SKETCH_2_R)
        with Locations(Location((0, -50, 0), (0, 0, 180))):
            Circle(SKETCH_2_R)
        with Locations(Location((0, -70, 0), (0, 0, 180))):
            Circle(SKETCH_2_R)
        with Locations(Location((0, -90, 0), (0, 0, 180))):
            Circle(SKETCH_2_R)
        with Locations(Location((0, -110, 0), (0, 0, 180))):
            Circle(SKETCH_2_R)
    extrude(amount=-CUT_EXTRUDE_1_DEPTH, mode=Mode.SUBTRACT)

    # 倒角1
    chamfer_1_edges = [part.edges().sort_by_distance(p)[0] for p in [
        (-4.5, 6.5, 0),
        (4.5, 6.5, 0),
        (4.5, 0, 0),
        (-4.5, 0, 0),
    ]]
    chamfer(chamfer_1_edges, length=CHAMFER_1_SIZE)

    # 草图3 → 切除-拉伸2 (cut)
    with BuildSketch(Plane(origin=(0, 6.5, 0), x_dir=(1, 0, 0), z_dir=(0, 1, 0))):
        with Locations(Location((0, 110, 0), (0, 0, 180))):
            Circle(SKETCH_3_R)
    cut_extrude_2 = extrude(amount=-CUT_EXTRUDE_2_DEPTH, mode=Mode.SUBTRACT)

    # 阵列(线性)1: 切除-拉伸2 ×12
    with Locations(*[(0, 0, i * PATTERN_LINEAR_1_PITCH) for i in range(1, PATTERN_LINEAR_1_COUNT)]):
        add(cut_extrude_2, mode=Mode.SUBTRACT)


solid = part.part
